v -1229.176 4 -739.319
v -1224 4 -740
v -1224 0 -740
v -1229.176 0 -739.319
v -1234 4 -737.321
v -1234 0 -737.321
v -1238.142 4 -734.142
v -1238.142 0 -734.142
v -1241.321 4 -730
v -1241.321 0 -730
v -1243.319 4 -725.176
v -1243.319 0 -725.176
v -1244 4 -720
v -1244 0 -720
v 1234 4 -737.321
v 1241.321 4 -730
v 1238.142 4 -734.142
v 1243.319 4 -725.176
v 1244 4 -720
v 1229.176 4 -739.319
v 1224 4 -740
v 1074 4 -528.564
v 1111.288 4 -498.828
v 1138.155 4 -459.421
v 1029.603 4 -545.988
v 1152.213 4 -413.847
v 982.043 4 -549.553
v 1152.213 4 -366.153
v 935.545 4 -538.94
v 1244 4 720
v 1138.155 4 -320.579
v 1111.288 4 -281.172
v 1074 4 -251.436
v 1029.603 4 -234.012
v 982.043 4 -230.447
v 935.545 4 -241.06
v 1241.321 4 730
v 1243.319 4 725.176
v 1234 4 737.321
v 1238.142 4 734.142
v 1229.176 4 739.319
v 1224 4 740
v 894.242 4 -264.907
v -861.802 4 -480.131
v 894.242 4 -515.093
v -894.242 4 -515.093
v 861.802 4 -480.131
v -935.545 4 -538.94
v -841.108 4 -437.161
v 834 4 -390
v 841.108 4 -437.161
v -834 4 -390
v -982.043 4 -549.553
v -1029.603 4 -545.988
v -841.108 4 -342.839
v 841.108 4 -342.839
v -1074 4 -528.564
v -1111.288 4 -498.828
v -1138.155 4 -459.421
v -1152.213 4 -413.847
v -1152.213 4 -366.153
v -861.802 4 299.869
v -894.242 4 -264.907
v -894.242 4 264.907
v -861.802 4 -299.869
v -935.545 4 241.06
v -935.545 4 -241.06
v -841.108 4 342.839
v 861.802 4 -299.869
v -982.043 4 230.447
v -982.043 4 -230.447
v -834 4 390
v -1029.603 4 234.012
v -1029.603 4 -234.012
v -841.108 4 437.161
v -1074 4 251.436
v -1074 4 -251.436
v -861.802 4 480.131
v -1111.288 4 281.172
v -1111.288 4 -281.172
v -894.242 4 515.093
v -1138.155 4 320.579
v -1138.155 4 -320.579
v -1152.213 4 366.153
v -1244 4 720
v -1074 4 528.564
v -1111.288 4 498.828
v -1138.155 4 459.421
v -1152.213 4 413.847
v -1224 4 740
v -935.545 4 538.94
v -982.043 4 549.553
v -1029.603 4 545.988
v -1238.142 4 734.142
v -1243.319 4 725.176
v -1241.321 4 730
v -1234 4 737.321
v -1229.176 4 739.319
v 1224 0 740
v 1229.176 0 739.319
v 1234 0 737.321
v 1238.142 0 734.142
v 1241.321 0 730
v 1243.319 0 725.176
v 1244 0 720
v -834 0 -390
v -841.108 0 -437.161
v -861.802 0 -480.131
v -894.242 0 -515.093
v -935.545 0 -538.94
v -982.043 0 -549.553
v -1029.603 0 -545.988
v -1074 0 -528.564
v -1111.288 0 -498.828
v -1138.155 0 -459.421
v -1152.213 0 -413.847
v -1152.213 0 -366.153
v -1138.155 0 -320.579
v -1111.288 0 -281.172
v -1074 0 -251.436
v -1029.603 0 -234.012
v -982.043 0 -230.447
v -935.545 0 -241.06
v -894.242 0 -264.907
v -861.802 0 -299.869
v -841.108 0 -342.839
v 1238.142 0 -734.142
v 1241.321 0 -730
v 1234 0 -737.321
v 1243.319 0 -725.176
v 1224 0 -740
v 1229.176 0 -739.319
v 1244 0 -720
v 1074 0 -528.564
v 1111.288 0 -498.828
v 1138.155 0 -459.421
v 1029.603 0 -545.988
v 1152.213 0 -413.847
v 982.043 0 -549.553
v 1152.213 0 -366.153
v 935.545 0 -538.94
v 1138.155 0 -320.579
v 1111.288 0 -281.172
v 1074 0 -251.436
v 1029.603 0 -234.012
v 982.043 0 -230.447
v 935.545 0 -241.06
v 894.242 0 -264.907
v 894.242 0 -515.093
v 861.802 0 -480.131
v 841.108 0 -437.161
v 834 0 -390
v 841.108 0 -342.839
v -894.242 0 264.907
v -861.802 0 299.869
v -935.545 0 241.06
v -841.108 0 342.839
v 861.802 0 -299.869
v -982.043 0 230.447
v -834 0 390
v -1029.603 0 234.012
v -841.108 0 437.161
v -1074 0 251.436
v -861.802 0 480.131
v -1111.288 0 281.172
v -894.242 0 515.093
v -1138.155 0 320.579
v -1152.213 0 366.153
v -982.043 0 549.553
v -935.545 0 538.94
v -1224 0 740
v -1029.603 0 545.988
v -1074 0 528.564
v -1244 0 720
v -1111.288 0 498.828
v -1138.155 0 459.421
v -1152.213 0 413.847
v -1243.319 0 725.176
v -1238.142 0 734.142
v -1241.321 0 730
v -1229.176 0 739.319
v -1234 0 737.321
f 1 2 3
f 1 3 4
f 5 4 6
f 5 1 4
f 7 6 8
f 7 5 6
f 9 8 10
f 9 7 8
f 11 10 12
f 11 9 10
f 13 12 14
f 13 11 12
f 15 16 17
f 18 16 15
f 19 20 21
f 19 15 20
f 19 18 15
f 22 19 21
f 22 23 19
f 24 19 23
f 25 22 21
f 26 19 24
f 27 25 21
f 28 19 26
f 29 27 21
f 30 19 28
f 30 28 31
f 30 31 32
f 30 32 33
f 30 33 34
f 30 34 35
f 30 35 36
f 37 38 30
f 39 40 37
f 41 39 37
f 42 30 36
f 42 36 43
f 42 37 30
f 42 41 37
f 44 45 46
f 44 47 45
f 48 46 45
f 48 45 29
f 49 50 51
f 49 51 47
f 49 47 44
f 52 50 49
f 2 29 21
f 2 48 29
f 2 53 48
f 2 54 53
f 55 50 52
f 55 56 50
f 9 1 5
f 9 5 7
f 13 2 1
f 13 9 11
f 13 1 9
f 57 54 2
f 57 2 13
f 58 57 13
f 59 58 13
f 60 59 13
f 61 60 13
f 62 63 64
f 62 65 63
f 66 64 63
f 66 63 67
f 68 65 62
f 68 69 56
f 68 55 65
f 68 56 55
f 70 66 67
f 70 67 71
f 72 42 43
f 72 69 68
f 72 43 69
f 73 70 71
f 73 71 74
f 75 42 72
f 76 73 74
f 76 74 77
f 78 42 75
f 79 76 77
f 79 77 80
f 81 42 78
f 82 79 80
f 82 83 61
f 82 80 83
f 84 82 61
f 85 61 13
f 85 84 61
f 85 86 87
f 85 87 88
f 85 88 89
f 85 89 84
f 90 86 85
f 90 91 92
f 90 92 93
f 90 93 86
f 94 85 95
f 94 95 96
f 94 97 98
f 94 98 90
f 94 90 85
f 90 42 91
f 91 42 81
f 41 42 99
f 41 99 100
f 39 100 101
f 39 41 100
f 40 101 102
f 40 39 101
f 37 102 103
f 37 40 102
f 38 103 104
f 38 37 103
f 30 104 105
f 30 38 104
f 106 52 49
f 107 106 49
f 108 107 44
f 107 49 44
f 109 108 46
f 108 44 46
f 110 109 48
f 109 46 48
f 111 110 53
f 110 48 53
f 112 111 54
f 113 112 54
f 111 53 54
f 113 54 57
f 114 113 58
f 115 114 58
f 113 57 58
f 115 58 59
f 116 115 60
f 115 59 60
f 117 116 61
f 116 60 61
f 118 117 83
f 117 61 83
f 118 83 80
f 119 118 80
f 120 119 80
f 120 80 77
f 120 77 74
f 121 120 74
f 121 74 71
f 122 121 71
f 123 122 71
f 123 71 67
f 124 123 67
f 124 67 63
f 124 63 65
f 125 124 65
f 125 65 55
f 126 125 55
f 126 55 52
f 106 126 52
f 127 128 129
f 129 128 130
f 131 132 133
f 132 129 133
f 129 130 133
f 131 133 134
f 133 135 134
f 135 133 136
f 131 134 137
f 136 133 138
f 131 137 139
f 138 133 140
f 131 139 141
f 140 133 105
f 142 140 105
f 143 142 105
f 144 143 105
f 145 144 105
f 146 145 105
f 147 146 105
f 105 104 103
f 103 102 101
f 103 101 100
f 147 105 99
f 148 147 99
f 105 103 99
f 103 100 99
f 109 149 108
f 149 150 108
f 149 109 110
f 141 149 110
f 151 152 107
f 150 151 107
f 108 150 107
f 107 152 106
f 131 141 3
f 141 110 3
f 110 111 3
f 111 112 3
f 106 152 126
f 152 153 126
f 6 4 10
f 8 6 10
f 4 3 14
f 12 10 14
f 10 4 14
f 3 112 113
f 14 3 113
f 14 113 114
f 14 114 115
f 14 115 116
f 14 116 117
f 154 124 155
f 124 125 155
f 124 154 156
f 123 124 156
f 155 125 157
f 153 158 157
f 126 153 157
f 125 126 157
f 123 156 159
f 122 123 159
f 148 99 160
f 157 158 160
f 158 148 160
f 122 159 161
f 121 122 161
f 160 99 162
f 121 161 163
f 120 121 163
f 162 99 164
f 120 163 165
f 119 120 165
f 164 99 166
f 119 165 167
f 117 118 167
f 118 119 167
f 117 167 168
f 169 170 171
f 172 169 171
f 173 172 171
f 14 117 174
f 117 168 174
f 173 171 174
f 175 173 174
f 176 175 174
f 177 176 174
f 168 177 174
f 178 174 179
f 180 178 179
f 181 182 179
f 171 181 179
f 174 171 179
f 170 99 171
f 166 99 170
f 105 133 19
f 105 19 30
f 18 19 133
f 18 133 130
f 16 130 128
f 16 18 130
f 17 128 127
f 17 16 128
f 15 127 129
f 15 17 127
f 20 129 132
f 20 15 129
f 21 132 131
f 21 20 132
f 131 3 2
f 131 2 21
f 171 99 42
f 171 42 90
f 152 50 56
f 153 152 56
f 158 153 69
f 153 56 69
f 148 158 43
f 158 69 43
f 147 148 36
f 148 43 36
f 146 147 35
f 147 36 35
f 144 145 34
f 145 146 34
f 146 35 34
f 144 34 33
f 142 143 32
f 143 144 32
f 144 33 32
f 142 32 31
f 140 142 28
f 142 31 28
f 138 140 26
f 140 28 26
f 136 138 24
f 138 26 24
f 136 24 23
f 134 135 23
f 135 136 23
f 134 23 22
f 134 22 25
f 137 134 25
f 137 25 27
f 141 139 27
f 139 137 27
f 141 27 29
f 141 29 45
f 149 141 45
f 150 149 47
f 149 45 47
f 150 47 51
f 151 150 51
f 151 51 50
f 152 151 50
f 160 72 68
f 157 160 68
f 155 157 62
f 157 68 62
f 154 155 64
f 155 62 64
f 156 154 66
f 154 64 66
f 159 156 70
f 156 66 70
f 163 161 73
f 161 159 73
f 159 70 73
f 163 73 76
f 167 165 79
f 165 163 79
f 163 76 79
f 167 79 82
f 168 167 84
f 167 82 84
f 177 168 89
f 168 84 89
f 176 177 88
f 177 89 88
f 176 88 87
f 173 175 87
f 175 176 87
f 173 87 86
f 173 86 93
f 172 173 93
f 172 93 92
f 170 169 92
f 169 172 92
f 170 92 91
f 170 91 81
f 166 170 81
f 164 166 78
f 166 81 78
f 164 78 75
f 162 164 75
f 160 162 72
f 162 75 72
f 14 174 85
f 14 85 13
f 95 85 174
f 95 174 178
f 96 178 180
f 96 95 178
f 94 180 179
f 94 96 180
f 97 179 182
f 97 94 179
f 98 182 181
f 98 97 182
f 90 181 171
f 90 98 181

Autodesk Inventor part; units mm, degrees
ref_plane "YZ Plane" through (0, 0, 0) normal (1, 0, 0) x (0, 1, 0)
ref_plane "XZ Plane" through (0, 0, 0) normal (0, 1, 0) x (-1, 0, 0)
ref_plane "XY Plane" through (0, 0, 0) normal (0, 0, 1) x (1, 0, 0)
sketch "Sketch1" plane through (0, 0, 0) normal (0, 1, 0) x (-1, 0, 0)
  line L0 (1244, -740) -> (-1244, -740)
  line L1 (-1244, -740) -> (-1244, 740)
  line L2 (-1244, 740) -> (1244, 740)
  line L3 (1244, 740) -> (1244, -740)
  line L4 (1244, -740) -> (-1244, 740) construction
  line L5 (-1244, -740) -> (1244, 740) construction
  point P0 (0, 0)
  dimension "d0" = 2488
  dimension "d1" = 1480
extrude "Plate1" add sketch "Sketch1" along normal blind 4
sketch "Sketch2" plane through (0, 4, 0) normal (0, 1, 0) x (1, 0, 0)
  line L0 (-1244, -740) -> (-1244, 740) construction
  line L1 (1244, -740) -> (-1244, -740) construction
  line L2 (1244, 740) -> (1244, -740) construction
  line L3 (-1244, 740) -> (1244, 740) construction
  circle A0 centre (-994, 390) radius 160
  point P0 (0, 0)
  dimension "d6" = 320
  dimension "d7" = 250
  dimension "d8" = 350
extrude "Cut1" cut sketch "Sketch2" against normal blind 4
mirror "Mirror1" about plane through (0, 0, 0) normal (1, 0, 0) of "Cut1"
mirror "Mirror2" about plane through (0, 0, 0) normal (0, 0, 1) of "Cut1"
fillet "Corner Round1" radius 20 4 edges at (-1244, 2, 740) (-1244, 2, -740) (1244, 2, -740) (1244, 2, 740)
equation "\"d9\" = Thickness"
equation "\"d2\" = Thickness"
equation "\"BendRadius\" = Thickness"
equation "\"BendReliefWidth\" = Thickness"
equation "\"BendReliefDepth\" = 0.5 * Thickness"
equation "\"CornerReliefSize\" = 4 * Thickness"
equation "\"MinimumRemnant\" = 2 * Thickness"
equation "\"TransitionRadius\" = BendRadius"
equation "\"JacobiRadiusSize\" = BendRadius"
equation "\"GapSize\" = Thickness"
equation "\"Thickness\" = 4"
properties part number "GBK-RK-0021 bottom"
